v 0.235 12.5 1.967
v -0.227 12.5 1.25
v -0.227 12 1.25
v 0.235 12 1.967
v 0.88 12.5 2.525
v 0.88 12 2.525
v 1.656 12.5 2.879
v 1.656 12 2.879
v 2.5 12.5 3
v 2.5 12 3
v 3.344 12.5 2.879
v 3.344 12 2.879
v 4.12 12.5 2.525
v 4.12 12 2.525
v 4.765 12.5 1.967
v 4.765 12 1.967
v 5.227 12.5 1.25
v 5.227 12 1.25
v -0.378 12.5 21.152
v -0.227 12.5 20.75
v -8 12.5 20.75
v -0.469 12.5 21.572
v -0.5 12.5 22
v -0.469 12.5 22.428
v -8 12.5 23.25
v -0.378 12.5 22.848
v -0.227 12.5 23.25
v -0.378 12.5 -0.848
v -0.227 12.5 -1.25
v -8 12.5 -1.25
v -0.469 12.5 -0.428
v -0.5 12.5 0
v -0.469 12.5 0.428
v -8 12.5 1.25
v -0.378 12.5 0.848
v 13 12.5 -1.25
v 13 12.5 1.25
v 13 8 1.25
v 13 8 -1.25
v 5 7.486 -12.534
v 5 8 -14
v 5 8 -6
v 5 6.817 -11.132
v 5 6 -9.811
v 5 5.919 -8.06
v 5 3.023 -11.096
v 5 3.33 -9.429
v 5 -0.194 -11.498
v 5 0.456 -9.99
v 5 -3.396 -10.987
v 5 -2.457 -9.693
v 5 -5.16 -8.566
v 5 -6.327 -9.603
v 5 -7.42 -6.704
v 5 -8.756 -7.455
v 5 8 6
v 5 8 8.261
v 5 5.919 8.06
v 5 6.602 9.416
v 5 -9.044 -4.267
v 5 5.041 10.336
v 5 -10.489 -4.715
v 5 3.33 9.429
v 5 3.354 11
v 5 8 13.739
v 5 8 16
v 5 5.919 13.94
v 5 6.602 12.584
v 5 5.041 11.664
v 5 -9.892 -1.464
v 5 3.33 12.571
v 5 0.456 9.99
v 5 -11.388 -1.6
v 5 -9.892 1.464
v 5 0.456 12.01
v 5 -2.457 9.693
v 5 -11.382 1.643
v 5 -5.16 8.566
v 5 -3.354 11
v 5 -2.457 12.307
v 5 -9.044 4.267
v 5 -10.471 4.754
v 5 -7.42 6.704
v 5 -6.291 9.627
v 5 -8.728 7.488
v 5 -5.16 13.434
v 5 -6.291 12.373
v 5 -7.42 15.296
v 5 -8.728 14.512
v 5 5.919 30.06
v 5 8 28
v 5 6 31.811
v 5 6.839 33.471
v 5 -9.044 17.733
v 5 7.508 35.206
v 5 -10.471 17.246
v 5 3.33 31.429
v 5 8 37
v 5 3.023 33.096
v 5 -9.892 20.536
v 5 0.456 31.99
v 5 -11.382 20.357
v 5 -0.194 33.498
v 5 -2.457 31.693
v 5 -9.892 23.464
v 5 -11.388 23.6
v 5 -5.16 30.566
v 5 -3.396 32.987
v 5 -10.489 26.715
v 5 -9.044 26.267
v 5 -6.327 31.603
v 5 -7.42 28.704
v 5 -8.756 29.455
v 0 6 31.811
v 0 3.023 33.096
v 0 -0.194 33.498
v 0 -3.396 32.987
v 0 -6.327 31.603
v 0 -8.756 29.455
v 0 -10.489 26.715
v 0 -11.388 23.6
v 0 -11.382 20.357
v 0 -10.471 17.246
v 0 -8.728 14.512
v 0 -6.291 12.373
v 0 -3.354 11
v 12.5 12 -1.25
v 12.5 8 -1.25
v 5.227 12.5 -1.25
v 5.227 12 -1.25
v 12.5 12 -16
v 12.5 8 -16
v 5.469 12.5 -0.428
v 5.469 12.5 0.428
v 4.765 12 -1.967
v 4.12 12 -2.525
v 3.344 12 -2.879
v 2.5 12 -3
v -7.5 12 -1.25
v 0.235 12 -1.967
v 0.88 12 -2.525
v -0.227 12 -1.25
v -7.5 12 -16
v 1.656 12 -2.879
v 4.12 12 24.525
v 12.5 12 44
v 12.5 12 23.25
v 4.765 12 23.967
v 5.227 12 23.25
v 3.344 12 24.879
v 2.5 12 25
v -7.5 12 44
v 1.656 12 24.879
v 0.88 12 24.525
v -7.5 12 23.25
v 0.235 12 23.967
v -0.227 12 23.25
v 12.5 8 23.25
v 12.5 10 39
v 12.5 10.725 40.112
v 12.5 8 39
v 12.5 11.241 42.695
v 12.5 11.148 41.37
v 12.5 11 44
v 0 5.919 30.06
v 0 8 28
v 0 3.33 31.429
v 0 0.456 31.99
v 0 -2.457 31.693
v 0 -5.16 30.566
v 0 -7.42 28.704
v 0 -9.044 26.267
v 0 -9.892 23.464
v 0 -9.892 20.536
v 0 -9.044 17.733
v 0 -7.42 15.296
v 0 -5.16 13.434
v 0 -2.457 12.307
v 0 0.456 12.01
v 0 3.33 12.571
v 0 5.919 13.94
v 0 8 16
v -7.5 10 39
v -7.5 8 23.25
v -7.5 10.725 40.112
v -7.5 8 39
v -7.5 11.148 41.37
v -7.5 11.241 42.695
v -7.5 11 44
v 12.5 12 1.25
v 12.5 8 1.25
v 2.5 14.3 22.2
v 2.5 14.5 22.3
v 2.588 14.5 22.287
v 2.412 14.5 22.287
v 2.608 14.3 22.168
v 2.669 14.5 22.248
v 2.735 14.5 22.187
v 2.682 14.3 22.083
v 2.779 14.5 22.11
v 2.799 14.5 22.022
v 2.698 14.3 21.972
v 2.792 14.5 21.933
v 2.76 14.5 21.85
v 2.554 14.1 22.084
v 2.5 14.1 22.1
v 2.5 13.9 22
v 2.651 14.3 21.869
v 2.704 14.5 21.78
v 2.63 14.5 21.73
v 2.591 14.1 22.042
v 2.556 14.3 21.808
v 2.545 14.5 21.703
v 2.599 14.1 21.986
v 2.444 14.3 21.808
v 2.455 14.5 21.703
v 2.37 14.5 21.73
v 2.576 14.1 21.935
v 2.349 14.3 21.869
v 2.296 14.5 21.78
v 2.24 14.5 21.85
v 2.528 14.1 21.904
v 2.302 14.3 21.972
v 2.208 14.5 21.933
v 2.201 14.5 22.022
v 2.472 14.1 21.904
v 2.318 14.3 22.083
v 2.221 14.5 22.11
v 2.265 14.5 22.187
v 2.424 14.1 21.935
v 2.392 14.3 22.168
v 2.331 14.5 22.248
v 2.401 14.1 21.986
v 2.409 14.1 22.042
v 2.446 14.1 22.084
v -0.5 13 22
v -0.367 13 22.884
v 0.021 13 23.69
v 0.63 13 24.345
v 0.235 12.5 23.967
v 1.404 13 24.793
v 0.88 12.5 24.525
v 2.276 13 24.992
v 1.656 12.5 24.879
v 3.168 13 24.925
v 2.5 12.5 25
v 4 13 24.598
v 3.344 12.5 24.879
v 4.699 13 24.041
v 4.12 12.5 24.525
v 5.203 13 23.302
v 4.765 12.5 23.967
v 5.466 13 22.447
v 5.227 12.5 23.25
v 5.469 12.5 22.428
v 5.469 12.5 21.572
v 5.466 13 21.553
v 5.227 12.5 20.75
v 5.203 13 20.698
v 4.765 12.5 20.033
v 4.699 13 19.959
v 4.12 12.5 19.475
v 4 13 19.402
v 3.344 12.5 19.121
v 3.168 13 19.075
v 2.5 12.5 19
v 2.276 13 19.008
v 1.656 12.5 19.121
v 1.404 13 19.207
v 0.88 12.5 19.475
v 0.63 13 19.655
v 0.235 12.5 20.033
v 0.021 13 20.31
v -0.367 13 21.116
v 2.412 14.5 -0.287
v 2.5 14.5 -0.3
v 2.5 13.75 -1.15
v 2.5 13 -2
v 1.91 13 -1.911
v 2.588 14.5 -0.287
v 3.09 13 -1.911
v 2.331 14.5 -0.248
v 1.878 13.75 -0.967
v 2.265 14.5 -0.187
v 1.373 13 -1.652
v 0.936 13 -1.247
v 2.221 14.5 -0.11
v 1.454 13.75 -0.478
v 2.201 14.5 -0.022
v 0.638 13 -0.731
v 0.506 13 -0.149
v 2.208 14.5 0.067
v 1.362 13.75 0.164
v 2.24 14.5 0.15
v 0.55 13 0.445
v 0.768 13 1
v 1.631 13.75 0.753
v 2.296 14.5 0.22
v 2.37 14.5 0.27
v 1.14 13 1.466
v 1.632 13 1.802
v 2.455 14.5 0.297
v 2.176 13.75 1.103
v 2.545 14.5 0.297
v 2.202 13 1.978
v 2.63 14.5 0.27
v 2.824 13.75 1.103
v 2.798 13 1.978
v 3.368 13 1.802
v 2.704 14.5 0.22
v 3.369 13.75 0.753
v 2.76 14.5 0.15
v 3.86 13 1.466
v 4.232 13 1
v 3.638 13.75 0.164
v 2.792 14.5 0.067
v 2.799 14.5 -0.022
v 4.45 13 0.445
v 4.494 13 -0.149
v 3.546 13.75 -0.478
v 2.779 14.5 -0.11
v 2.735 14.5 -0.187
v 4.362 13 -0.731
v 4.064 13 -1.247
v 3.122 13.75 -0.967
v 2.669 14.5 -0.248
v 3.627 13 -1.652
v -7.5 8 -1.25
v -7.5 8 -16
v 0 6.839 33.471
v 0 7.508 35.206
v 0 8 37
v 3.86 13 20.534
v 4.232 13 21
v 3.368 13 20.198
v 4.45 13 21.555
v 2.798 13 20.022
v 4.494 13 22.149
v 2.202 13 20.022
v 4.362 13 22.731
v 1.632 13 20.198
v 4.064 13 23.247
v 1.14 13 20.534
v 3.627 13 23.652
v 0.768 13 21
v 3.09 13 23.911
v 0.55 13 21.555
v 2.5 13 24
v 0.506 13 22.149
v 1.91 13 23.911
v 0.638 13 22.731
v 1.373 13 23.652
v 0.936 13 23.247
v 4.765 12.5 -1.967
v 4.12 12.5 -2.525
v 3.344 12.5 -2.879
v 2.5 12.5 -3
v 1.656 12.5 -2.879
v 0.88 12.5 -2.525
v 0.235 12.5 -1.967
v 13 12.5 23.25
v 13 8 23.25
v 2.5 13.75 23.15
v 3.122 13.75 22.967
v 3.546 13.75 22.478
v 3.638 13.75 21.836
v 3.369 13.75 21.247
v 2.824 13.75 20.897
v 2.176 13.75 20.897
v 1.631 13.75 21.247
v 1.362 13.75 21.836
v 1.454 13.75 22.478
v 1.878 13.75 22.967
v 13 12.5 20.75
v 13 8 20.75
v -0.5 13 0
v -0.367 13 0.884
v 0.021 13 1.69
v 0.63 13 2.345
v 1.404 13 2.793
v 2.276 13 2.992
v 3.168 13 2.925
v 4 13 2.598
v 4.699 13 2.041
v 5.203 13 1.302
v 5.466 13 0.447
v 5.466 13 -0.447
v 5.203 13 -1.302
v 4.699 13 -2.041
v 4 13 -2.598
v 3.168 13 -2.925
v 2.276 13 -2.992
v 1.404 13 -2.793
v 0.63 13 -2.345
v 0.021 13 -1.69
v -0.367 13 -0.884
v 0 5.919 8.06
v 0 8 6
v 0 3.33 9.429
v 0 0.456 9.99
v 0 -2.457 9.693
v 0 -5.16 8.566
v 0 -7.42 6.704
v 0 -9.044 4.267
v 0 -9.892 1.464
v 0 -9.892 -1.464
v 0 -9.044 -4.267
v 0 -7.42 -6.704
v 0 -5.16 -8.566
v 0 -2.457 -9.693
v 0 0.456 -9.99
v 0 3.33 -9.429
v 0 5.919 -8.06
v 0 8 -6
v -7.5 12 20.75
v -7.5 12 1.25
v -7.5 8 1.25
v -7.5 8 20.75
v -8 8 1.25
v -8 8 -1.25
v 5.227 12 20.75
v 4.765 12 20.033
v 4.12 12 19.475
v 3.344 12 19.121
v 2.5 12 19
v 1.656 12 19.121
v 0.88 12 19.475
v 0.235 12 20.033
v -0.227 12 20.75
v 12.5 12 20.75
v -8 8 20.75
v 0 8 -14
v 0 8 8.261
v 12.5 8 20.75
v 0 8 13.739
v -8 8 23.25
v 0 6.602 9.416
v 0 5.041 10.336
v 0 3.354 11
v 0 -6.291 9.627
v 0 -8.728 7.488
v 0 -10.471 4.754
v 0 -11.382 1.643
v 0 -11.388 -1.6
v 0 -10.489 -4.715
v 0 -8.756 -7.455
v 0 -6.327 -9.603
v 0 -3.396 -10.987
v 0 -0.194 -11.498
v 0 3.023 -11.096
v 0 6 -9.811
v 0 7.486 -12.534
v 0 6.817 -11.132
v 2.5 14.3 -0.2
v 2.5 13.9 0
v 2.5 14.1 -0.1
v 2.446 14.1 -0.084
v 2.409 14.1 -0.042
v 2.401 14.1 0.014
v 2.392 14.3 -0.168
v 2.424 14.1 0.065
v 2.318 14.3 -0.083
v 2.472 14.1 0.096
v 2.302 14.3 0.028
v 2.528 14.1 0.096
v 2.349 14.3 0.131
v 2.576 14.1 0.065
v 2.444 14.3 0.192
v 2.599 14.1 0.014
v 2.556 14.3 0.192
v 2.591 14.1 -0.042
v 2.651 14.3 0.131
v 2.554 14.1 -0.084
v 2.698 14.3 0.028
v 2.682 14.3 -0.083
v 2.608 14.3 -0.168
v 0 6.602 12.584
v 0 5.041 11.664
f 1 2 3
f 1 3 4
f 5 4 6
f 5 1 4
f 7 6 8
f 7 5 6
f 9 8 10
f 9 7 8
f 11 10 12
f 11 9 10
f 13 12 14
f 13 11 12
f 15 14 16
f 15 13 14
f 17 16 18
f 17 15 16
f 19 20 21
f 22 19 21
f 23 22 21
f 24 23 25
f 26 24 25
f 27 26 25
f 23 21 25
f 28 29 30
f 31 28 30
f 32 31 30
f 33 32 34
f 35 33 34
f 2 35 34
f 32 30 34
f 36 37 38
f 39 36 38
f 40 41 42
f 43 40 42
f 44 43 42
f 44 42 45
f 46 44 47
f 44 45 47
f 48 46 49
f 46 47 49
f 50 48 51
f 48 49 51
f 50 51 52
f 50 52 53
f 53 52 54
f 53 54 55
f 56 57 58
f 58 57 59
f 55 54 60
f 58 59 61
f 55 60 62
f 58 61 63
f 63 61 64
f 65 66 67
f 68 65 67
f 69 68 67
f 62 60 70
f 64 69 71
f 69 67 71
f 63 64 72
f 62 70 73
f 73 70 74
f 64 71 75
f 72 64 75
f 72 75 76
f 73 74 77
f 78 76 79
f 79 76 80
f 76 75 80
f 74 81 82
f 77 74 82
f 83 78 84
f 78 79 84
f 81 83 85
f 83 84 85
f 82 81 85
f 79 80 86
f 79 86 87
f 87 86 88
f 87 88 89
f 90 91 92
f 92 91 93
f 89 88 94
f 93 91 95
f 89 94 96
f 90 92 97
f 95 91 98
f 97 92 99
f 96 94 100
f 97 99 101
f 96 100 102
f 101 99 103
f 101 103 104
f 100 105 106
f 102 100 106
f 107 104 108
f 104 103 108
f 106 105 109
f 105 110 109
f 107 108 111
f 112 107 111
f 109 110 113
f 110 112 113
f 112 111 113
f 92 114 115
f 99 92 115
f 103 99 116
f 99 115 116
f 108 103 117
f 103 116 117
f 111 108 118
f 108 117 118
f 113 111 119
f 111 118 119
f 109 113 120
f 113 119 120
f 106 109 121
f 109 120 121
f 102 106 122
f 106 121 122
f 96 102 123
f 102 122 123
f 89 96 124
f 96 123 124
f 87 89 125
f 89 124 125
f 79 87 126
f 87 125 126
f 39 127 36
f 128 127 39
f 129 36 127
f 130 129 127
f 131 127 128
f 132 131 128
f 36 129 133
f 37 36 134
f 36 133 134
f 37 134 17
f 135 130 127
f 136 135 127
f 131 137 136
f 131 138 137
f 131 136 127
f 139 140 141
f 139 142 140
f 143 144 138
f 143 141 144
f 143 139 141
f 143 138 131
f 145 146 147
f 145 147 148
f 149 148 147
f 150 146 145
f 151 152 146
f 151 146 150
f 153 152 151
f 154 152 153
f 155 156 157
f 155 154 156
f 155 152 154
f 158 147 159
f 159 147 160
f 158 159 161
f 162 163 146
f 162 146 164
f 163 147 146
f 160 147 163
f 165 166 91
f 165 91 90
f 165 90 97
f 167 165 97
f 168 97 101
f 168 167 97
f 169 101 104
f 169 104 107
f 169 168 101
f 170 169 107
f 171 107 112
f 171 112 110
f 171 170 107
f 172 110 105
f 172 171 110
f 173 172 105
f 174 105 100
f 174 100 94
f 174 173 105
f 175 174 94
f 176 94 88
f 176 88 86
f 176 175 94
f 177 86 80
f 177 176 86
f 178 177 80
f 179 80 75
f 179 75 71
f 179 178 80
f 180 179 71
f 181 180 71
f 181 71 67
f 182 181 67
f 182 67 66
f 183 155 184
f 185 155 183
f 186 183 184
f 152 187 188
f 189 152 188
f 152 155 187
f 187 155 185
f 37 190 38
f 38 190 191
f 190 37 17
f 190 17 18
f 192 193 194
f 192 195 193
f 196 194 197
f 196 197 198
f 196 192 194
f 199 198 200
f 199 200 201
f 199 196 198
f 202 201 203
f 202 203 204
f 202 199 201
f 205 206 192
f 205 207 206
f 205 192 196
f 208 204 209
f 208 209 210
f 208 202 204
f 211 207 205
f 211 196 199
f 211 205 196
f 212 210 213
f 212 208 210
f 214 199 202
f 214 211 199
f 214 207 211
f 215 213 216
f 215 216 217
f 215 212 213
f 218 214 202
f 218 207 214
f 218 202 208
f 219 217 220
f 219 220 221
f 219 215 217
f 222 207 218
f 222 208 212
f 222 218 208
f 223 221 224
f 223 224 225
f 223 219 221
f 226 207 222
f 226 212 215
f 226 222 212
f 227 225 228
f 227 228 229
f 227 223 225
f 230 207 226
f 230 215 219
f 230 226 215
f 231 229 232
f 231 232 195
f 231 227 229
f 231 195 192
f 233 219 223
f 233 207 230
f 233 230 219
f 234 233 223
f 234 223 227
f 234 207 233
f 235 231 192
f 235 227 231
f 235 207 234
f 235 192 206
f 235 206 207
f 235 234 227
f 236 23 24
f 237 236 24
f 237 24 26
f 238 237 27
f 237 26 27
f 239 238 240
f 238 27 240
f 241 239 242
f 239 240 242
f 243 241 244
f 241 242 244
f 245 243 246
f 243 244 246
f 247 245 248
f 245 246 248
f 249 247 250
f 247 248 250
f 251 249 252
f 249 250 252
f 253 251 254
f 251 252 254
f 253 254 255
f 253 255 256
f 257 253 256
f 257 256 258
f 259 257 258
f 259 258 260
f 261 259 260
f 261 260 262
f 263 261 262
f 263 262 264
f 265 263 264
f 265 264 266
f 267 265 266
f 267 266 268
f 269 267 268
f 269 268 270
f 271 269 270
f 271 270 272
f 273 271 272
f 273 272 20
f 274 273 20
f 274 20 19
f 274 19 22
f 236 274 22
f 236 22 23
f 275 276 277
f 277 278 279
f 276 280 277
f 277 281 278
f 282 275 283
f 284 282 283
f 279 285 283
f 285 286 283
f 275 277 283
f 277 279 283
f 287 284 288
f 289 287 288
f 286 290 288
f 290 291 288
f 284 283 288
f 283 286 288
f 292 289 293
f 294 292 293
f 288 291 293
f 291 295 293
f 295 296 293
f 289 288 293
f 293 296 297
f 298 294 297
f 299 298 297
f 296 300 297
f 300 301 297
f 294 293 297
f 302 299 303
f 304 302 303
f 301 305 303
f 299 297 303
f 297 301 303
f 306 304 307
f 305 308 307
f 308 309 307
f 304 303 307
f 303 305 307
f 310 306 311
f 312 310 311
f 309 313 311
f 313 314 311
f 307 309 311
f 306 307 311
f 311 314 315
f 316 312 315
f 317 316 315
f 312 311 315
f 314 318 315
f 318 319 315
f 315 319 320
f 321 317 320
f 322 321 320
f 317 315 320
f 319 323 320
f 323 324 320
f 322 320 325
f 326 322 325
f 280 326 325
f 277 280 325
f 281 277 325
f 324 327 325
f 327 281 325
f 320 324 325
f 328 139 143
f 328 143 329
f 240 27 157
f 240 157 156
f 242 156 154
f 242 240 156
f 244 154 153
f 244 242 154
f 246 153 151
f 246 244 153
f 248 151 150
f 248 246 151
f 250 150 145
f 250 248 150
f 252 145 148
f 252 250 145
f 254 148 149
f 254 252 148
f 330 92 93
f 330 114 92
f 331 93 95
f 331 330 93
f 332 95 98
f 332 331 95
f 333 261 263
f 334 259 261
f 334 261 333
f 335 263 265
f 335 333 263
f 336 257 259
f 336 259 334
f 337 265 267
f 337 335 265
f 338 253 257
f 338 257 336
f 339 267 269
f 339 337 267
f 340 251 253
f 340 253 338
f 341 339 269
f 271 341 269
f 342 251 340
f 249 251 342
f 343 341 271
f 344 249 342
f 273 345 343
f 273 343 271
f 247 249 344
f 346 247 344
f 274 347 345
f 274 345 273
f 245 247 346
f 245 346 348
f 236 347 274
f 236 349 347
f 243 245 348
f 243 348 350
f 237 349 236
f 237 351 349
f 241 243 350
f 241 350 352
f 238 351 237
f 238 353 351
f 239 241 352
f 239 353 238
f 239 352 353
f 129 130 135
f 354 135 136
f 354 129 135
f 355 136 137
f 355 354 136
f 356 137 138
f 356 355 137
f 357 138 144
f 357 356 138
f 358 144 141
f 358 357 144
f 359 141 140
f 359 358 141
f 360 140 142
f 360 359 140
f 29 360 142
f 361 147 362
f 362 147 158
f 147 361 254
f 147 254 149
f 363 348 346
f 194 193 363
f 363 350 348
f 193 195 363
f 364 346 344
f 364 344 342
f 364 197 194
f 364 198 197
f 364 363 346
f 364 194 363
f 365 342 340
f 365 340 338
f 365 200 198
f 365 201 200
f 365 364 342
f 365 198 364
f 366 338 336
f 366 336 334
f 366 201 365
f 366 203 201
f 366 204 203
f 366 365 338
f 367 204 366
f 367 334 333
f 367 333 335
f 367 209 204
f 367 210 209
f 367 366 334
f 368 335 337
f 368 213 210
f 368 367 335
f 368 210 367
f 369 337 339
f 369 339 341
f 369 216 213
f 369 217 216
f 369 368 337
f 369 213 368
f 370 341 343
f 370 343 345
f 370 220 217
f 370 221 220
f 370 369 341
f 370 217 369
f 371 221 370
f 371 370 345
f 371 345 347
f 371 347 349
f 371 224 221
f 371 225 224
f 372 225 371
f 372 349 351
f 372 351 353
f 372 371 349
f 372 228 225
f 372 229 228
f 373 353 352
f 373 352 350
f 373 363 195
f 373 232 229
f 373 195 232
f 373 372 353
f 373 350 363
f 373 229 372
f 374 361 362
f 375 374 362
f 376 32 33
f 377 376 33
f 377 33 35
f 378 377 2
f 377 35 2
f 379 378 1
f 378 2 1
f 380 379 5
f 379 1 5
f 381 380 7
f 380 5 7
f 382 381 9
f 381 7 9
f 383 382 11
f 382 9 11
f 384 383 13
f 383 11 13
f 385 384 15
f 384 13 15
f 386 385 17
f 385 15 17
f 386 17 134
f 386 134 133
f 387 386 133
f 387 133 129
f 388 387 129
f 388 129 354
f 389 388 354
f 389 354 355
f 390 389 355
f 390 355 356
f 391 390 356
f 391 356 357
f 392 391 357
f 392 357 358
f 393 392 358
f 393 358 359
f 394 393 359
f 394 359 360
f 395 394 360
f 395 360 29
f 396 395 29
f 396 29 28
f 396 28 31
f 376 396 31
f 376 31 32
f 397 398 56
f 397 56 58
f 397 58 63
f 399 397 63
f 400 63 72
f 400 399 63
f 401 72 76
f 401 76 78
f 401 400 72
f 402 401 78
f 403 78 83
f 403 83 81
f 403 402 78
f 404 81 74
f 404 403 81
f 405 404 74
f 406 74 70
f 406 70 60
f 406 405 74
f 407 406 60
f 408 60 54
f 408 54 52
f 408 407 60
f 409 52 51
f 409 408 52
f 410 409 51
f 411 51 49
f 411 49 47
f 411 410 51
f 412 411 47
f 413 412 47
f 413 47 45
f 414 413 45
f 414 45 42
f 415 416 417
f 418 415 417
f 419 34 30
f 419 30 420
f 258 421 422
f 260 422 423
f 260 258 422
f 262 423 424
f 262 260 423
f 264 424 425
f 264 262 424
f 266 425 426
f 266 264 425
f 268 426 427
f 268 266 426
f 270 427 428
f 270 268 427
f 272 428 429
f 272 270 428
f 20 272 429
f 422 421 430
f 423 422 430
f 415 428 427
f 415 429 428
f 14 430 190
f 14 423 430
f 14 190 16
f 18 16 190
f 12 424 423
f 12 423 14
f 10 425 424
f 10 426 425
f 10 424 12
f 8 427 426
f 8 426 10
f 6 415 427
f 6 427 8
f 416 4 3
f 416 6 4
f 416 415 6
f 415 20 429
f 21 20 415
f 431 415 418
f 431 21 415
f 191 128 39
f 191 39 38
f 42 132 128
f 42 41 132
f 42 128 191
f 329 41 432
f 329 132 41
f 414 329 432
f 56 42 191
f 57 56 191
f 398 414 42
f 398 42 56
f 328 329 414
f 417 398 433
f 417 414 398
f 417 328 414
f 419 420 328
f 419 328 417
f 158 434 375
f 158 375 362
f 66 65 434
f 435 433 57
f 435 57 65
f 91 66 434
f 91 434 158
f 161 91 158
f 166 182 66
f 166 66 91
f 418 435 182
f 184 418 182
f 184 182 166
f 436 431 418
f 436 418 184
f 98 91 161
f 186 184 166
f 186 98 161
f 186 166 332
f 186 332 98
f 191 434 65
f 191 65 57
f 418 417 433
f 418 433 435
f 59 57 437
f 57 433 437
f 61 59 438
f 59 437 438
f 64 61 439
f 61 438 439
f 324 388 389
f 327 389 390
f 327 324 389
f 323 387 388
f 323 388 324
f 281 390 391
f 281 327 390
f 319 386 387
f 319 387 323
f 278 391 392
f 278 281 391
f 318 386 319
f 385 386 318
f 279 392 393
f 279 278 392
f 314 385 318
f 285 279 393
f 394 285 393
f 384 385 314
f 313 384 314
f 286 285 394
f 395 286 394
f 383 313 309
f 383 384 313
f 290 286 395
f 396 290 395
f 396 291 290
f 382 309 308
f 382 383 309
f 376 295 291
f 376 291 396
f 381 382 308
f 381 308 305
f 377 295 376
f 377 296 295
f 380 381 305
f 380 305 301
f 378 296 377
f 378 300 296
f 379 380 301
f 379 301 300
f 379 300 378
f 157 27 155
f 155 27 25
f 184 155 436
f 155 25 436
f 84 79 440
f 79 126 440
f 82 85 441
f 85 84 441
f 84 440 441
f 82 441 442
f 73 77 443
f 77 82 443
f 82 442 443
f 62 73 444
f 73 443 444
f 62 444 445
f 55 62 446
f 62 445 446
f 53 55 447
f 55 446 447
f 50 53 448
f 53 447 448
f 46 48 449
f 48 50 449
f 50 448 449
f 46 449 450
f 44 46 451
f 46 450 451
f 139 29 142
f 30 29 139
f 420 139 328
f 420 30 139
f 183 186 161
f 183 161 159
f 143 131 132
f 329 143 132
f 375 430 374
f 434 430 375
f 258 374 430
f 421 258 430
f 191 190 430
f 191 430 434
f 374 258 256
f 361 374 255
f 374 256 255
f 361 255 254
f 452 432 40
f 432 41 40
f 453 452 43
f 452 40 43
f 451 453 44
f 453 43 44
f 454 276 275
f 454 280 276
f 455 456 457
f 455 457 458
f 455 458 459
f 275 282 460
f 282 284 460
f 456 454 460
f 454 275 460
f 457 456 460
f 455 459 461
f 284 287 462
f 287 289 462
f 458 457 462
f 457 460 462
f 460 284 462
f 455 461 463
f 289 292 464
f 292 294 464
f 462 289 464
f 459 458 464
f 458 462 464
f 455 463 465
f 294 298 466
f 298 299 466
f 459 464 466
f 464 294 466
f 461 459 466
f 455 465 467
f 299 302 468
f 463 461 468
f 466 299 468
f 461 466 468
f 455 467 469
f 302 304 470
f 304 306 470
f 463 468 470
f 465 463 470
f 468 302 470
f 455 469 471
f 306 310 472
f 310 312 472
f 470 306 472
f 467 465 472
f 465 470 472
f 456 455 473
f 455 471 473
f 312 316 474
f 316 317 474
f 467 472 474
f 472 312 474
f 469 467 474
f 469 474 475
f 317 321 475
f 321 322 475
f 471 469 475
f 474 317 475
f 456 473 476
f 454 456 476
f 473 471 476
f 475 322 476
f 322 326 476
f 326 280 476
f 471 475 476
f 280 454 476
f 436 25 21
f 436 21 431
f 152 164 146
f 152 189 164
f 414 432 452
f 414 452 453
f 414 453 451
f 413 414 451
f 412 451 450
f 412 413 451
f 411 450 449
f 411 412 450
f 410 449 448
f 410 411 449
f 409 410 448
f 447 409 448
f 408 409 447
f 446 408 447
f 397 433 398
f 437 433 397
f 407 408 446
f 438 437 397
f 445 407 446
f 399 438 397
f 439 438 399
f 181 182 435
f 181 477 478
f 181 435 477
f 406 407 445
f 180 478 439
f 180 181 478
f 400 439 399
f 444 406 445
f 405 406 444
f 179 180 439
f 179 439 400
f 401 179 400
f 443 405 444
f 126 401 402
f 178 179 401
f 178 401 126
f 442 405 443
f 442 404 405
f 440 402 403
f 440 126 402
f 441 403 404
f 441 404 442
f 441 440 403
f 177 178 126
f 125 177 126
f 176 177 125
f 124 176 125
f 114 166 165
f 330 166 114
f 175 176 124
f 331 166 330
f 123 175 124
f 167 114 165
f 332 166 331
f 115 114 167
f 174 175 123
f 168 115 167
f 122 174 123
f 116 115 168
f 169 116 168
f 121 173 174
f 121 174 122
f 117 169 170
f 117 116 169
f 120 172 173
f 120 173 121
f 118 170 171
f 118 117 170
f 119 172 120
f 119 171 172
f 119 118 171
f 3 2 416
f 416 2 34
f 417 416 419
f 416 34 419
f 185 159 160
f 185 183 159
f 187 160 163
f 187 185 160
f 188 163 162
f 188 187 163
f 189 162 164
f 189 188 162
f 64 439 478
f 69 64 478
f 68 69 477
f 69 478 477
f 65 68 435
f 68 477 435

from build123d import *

# Parameters (mm, degrees)
F0_R           = 11.5
F0_R_2         = 10
F1_DEPTH       = 5
F5_DEPTH       = 10
F5_DEPTH_BACK  = 10
F6_W           = 4.5
F6_H           = 2.5
F7_DEPTH       = 0.5
F7_DEPTH_BACK  = 20.5
F8_R           = 3
F9_DEPTH       = 0.5
F9_DEPTH_BACK  = 0.5
F13_DEPTH      = 2.5
F13_DEPTH_BACK = 2.5


with BuildPart() as f1:
    # F0 (on Right) → F1 (new body)
    with BuildSketch(Plane.YZ):
        Circle(F0_R)
        Circle(F0_R_2, mode=Mode.SUBTRACT)
    extrude(amount=F1_DEPTH)


with BuildPart() as f3_1:
    # F3: copy of F1
    add(f1.part.moved(Location((0, 0, 22))))


with BuildPart() as f1_1:
    add(f1.part)

    add(f3_1.part)  # F5 merges F3_1
    # F4 (on offset) → F5 (join, two sides)
    with BuildSketch(Plane(origin=(2.5, 0, 0), x_dir=(0, -1, 0), z_dir=(-1, 0, 0))) as f5_sk:
        with BuildLine():
            Line((-12, 44), (-12, 39))
            Line((-12, 39), (-10, 39))
            ThreePointArc((-10, 39), (-11.1478150705, 41.3704369859), (-11, 44))
            Line((-11, 44), (-12, 44))
        make_face()
        with BuildLine():
            Line((-12, 39), (-12, -16))
            Line((-12, -16), (-8, -16))
            Line((-8, -16), (-8, -14))
            Line((-8, -14), (-8, -8.2613558209))
            ThreePointArc((-8, -8.2613558209), (-11.5, 0), (-8, 8.2613558209))
            Line((-8, 8.2613558209), (-8, 13.7386441791))
            ThreePointArc((-8, 13.7386441791), (-11.5, 22), (-8, 30.2613558209))
            Line((-8, 30.2613558209), (-8, 37))
            Line((-8, 37), (-8, 39))
            Line((-8, 39), (-10, 39))
            Line((-10, 39), (-12, 39))
        make_face()
        with BuildLine():
            ThreePointArc((-8, 30.2613558209), (-11.5, 22), (-8, 13.7386441791))
            Line((-8, 13.7386441791), (-8, 30.2613558209))
        make_face()
        with BuildLine():
            ThreePointArc((-8, 8.2613558209), (-11.5, 0), (-8, -8.2613558209))
            Line((-8, -8.2613558209), (-8, 8.2613558209))
        make_face()
    extrude(amount=F5_DEPTH)
    extrude(f5_sk.sketch, amount=-F5_DEPTH_BACK)

    # F6 (on face) → F7 (join, two sides)
    with BuildSketch(Plane(origin=(-7.5, 0, 0), x_dir=(0, -1, 0), z_dir=(-1, 0, 0))) as f7_sk:
        with Locations((-10.25, 0)):
            Rectangle(F6_W, F6_H)
        with Locations((-10.25, 22)):
            Rectangle(F6_W, F6_H)
    extrude(amount=F7_DEPTH)
    extrude(f7_sk.sketch, amount=-F7_DEPTH_BACK)

    # F8 (on face) → F9 (join, two sides)
    with BuildSketch(Plane(origin=(0, 12.5, 0), x_dir=(-1, 0, 0), z_dir=(0, 1, 0))) as f9_sk:
        with Locations((-2.5, 22)):
            Circle(F8_R)
        with Locations((-2.5, 0)):
            Circle(F8_R)
    extrude(amount=F9_DEPTH)
    extrude(f9_sk.sketch, amount=-F9_DEPTH_BACK)

    # F10 (on offset) → F11 (revolve)
    with BuildSketch(Plane(origin=(2.5, 0, 0), x_dir=(0, -1, 0), z_dir=(-1, 0, 0))):
        Polygon((-13, -2), (-13, 0), (-13.9, 0), (-14.5, -0.3), align=None)
    revolve(axis=Axis((2.5, 13.75, 0), (0, 1, 0)))

    # F10 (on offset) → F12 (revolve)
    with BuildSketch(Plane(origin=(2.5, 0, 0), x_dir=(0, -1, 0), z_dir=(-1, 0, 0))):
        Polygon((-13, 24), (-14.5, 22.3), (-13.9, 22), (-13, 22), align=None)
    revolve(axis=Axis((2.5, 13.75, 22), (0, 1, 0)))

    # F4 (on offset) → F13 (join, two sides)
    with BuildSketch(Plane(origin=(2.5, 0, 0), x_dir=(0, -1, 0), z_dir=(-1, 0, 0))) as f13_sk:
        with BuildLine():
            ThreePointArc((-6, 31.8107084352), (-7.1956056108, 34.3299660424), (-8, 37))
            Line((-8, 37), (-8, 30.2613558209))
            ThreePointArc((-8, 30.2613558209), (-7.0427355041, 31.0911977549), (-6, 31.8107084352))
        make_face()
        with BuildLine():
            Line((-8, -8.2613558209), (-8, -14))
            ThreePointArc((-8, -14), (-7.1707018436, -11.8238598451), (-6, -9.8107084352))
            ThreePointArc((-6, -9.8107084352), (-7.0427355041, -9.0911977549), (-8, -8.2613558209))
        make_face()
    extrude(amount=F13_DEPTH)
    extrude(f13_sk.sketch, amount=-F13_DEPTH_BACK)


solid = f1_1.part
